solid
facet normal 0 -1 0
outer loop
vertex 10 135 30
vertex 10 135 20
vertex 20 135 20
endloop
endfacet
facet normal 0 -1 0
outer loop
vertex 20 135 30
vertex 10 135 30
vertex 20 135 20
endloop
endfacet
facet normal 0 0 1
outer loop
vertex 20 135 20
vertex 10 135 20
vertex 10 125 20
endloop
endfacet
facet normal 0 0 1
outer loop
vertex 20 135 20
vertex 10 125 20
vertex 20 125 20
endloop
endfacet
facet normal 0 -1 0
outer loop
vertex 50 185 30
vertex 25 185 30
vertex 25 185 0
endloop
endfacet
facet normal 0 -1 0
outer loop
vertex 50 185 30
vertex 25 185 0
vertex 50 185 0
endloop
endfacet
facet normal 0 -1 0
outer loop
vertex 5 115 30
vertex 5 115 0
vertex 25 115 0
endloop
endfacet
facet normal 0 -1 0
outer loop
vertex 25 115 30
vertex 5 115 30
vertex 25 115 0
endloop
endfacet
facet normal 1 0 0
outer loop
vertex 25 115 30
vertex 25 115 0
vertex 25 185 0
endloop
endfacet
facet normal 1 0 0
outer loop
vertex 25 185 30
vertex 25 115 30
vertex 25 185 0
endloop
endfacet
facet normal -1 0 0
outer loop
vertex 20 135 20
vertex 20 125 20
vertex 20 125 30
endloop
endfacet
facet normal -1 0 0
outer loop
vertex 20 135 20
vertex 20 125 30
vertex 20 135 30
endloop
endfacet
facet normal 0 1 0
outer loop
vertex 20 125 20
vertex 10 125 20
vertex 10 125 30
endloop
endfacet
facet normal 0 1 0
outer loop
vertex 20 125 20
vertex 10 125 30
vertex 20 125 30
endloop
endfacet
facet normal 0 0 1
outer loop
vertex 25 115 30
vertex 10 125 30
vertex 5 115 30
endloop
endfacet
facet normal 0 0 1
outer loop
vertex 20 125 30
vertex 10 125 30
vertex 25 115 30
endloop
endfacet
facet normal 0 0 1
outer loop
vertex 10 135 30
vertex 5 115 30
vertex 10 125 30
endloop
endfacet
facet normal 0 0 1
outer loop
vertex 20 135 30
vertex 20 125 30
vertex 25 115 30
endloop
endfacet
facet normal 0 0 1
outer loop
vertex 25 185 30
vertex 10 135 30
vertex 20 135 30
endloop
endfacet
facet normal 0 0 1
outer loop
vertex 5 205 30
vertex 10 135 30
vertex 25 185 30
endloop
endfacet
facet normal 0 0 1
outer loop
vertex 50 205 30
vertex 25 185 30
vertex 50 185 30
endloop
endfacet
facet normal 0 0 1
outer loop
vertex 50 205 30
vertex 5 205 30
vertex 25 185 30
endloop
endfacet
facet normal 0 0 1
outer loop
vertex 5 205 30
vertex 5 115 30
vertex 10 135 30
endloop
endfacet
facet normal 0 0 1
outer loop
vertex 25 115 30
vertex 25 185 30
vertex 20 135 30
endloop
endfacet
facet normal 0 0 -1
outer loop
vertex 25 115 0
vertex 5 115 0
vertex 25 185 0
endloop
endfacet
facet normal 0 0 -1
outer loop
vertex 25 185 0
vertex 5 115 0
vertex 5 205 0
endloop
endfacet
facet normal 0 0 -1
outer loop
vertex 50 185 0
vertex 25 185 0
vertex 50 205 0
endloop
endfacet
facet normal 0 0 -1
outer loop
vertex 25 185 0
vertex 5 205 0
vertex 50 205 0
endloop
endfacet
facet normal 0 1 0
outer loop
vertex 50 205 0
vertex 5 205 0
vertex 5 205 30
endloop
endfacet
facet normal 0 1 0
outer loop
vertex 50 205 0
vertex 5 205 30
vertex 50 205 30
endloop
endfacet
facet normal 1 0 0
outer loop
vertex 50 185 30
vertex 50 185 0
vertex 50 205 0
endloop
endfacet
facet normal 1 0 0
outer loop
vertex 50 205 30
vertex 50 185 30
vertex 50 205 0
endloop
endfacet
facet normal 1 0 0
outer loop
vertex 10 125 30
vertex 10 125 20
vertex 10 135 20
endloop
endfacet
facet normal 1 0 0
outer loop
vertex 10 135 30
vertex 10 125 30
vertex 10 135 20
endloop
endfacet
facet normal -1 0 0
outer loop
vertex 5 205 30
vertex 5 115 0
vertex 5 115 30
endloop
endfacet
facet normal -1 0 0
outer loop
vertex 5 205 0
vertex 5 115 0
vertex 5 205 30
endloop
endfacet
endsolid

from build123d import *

# Parameters (mm, degrees)
BOX021003010009_W     = 10
BOX021003010009_H     = 10
BOX021003010009_DEPTH = 12
BOX021003010006_W     = 45
BOX021003010006_H     = 20
BOX021003010006_DEPTH = 30
BOX021003010005_W     = 20
BOX021003010005_H     = 90
BOX021003010005_DEPTH = 30


with BuildPart() as hueco_fregadero:
    # Box021003010009 → Box021003010009 (new body)
    with BuildSketch(Plane(origin=(10, 125, 20), x_dir=(1, 0, 0), z_dir=(0, 0, 1))):
        with Locations((5, 5)):
            Rectangle(BOX021003010009_W, BOX021003010009_H)
    extrude(amount=BOX021003010009_DEPTH)


with BuildPart() as mueble_bajo_corto_cocina:
    # Box021003010006 → Box021003010006 (new body)
    with BuildSketch(Plane(origin=(5, 185, 0), x_dir=(1, 0, 0), z_dir=(0, 0, 1))):
        with Locations((22.5, 10)):
            Rectangle(BOX021003010006_W, BOX021003010006_H)
    extrude(amount=BOX021003010006_DEPTH)


with BuildPart() as mueble_bajo_cocina:
    # Box021003010005 → Box021003010005 (new body)
    with BuildSketch(Plane(origin=(5, 115, 0), x_dir=(1, 0, 0), z_dir=(0, 0, 1))):
        with Locations((10, 45)):
            Rectangle(BOX021003010005_W, BOX021003010005_H)
    extrude(amount=BOX021003010005_DEPTH)

    # Fusion007: union Mueble bajo corto Cocina
    add(mueble_bajo_corto_cocina.part)

    # Cut011: cut Hueco fregadero
    add(hueco_fregadero.part, mode=Mode.SUBTRACT)


solid = mueble_bajo_cocina.part
